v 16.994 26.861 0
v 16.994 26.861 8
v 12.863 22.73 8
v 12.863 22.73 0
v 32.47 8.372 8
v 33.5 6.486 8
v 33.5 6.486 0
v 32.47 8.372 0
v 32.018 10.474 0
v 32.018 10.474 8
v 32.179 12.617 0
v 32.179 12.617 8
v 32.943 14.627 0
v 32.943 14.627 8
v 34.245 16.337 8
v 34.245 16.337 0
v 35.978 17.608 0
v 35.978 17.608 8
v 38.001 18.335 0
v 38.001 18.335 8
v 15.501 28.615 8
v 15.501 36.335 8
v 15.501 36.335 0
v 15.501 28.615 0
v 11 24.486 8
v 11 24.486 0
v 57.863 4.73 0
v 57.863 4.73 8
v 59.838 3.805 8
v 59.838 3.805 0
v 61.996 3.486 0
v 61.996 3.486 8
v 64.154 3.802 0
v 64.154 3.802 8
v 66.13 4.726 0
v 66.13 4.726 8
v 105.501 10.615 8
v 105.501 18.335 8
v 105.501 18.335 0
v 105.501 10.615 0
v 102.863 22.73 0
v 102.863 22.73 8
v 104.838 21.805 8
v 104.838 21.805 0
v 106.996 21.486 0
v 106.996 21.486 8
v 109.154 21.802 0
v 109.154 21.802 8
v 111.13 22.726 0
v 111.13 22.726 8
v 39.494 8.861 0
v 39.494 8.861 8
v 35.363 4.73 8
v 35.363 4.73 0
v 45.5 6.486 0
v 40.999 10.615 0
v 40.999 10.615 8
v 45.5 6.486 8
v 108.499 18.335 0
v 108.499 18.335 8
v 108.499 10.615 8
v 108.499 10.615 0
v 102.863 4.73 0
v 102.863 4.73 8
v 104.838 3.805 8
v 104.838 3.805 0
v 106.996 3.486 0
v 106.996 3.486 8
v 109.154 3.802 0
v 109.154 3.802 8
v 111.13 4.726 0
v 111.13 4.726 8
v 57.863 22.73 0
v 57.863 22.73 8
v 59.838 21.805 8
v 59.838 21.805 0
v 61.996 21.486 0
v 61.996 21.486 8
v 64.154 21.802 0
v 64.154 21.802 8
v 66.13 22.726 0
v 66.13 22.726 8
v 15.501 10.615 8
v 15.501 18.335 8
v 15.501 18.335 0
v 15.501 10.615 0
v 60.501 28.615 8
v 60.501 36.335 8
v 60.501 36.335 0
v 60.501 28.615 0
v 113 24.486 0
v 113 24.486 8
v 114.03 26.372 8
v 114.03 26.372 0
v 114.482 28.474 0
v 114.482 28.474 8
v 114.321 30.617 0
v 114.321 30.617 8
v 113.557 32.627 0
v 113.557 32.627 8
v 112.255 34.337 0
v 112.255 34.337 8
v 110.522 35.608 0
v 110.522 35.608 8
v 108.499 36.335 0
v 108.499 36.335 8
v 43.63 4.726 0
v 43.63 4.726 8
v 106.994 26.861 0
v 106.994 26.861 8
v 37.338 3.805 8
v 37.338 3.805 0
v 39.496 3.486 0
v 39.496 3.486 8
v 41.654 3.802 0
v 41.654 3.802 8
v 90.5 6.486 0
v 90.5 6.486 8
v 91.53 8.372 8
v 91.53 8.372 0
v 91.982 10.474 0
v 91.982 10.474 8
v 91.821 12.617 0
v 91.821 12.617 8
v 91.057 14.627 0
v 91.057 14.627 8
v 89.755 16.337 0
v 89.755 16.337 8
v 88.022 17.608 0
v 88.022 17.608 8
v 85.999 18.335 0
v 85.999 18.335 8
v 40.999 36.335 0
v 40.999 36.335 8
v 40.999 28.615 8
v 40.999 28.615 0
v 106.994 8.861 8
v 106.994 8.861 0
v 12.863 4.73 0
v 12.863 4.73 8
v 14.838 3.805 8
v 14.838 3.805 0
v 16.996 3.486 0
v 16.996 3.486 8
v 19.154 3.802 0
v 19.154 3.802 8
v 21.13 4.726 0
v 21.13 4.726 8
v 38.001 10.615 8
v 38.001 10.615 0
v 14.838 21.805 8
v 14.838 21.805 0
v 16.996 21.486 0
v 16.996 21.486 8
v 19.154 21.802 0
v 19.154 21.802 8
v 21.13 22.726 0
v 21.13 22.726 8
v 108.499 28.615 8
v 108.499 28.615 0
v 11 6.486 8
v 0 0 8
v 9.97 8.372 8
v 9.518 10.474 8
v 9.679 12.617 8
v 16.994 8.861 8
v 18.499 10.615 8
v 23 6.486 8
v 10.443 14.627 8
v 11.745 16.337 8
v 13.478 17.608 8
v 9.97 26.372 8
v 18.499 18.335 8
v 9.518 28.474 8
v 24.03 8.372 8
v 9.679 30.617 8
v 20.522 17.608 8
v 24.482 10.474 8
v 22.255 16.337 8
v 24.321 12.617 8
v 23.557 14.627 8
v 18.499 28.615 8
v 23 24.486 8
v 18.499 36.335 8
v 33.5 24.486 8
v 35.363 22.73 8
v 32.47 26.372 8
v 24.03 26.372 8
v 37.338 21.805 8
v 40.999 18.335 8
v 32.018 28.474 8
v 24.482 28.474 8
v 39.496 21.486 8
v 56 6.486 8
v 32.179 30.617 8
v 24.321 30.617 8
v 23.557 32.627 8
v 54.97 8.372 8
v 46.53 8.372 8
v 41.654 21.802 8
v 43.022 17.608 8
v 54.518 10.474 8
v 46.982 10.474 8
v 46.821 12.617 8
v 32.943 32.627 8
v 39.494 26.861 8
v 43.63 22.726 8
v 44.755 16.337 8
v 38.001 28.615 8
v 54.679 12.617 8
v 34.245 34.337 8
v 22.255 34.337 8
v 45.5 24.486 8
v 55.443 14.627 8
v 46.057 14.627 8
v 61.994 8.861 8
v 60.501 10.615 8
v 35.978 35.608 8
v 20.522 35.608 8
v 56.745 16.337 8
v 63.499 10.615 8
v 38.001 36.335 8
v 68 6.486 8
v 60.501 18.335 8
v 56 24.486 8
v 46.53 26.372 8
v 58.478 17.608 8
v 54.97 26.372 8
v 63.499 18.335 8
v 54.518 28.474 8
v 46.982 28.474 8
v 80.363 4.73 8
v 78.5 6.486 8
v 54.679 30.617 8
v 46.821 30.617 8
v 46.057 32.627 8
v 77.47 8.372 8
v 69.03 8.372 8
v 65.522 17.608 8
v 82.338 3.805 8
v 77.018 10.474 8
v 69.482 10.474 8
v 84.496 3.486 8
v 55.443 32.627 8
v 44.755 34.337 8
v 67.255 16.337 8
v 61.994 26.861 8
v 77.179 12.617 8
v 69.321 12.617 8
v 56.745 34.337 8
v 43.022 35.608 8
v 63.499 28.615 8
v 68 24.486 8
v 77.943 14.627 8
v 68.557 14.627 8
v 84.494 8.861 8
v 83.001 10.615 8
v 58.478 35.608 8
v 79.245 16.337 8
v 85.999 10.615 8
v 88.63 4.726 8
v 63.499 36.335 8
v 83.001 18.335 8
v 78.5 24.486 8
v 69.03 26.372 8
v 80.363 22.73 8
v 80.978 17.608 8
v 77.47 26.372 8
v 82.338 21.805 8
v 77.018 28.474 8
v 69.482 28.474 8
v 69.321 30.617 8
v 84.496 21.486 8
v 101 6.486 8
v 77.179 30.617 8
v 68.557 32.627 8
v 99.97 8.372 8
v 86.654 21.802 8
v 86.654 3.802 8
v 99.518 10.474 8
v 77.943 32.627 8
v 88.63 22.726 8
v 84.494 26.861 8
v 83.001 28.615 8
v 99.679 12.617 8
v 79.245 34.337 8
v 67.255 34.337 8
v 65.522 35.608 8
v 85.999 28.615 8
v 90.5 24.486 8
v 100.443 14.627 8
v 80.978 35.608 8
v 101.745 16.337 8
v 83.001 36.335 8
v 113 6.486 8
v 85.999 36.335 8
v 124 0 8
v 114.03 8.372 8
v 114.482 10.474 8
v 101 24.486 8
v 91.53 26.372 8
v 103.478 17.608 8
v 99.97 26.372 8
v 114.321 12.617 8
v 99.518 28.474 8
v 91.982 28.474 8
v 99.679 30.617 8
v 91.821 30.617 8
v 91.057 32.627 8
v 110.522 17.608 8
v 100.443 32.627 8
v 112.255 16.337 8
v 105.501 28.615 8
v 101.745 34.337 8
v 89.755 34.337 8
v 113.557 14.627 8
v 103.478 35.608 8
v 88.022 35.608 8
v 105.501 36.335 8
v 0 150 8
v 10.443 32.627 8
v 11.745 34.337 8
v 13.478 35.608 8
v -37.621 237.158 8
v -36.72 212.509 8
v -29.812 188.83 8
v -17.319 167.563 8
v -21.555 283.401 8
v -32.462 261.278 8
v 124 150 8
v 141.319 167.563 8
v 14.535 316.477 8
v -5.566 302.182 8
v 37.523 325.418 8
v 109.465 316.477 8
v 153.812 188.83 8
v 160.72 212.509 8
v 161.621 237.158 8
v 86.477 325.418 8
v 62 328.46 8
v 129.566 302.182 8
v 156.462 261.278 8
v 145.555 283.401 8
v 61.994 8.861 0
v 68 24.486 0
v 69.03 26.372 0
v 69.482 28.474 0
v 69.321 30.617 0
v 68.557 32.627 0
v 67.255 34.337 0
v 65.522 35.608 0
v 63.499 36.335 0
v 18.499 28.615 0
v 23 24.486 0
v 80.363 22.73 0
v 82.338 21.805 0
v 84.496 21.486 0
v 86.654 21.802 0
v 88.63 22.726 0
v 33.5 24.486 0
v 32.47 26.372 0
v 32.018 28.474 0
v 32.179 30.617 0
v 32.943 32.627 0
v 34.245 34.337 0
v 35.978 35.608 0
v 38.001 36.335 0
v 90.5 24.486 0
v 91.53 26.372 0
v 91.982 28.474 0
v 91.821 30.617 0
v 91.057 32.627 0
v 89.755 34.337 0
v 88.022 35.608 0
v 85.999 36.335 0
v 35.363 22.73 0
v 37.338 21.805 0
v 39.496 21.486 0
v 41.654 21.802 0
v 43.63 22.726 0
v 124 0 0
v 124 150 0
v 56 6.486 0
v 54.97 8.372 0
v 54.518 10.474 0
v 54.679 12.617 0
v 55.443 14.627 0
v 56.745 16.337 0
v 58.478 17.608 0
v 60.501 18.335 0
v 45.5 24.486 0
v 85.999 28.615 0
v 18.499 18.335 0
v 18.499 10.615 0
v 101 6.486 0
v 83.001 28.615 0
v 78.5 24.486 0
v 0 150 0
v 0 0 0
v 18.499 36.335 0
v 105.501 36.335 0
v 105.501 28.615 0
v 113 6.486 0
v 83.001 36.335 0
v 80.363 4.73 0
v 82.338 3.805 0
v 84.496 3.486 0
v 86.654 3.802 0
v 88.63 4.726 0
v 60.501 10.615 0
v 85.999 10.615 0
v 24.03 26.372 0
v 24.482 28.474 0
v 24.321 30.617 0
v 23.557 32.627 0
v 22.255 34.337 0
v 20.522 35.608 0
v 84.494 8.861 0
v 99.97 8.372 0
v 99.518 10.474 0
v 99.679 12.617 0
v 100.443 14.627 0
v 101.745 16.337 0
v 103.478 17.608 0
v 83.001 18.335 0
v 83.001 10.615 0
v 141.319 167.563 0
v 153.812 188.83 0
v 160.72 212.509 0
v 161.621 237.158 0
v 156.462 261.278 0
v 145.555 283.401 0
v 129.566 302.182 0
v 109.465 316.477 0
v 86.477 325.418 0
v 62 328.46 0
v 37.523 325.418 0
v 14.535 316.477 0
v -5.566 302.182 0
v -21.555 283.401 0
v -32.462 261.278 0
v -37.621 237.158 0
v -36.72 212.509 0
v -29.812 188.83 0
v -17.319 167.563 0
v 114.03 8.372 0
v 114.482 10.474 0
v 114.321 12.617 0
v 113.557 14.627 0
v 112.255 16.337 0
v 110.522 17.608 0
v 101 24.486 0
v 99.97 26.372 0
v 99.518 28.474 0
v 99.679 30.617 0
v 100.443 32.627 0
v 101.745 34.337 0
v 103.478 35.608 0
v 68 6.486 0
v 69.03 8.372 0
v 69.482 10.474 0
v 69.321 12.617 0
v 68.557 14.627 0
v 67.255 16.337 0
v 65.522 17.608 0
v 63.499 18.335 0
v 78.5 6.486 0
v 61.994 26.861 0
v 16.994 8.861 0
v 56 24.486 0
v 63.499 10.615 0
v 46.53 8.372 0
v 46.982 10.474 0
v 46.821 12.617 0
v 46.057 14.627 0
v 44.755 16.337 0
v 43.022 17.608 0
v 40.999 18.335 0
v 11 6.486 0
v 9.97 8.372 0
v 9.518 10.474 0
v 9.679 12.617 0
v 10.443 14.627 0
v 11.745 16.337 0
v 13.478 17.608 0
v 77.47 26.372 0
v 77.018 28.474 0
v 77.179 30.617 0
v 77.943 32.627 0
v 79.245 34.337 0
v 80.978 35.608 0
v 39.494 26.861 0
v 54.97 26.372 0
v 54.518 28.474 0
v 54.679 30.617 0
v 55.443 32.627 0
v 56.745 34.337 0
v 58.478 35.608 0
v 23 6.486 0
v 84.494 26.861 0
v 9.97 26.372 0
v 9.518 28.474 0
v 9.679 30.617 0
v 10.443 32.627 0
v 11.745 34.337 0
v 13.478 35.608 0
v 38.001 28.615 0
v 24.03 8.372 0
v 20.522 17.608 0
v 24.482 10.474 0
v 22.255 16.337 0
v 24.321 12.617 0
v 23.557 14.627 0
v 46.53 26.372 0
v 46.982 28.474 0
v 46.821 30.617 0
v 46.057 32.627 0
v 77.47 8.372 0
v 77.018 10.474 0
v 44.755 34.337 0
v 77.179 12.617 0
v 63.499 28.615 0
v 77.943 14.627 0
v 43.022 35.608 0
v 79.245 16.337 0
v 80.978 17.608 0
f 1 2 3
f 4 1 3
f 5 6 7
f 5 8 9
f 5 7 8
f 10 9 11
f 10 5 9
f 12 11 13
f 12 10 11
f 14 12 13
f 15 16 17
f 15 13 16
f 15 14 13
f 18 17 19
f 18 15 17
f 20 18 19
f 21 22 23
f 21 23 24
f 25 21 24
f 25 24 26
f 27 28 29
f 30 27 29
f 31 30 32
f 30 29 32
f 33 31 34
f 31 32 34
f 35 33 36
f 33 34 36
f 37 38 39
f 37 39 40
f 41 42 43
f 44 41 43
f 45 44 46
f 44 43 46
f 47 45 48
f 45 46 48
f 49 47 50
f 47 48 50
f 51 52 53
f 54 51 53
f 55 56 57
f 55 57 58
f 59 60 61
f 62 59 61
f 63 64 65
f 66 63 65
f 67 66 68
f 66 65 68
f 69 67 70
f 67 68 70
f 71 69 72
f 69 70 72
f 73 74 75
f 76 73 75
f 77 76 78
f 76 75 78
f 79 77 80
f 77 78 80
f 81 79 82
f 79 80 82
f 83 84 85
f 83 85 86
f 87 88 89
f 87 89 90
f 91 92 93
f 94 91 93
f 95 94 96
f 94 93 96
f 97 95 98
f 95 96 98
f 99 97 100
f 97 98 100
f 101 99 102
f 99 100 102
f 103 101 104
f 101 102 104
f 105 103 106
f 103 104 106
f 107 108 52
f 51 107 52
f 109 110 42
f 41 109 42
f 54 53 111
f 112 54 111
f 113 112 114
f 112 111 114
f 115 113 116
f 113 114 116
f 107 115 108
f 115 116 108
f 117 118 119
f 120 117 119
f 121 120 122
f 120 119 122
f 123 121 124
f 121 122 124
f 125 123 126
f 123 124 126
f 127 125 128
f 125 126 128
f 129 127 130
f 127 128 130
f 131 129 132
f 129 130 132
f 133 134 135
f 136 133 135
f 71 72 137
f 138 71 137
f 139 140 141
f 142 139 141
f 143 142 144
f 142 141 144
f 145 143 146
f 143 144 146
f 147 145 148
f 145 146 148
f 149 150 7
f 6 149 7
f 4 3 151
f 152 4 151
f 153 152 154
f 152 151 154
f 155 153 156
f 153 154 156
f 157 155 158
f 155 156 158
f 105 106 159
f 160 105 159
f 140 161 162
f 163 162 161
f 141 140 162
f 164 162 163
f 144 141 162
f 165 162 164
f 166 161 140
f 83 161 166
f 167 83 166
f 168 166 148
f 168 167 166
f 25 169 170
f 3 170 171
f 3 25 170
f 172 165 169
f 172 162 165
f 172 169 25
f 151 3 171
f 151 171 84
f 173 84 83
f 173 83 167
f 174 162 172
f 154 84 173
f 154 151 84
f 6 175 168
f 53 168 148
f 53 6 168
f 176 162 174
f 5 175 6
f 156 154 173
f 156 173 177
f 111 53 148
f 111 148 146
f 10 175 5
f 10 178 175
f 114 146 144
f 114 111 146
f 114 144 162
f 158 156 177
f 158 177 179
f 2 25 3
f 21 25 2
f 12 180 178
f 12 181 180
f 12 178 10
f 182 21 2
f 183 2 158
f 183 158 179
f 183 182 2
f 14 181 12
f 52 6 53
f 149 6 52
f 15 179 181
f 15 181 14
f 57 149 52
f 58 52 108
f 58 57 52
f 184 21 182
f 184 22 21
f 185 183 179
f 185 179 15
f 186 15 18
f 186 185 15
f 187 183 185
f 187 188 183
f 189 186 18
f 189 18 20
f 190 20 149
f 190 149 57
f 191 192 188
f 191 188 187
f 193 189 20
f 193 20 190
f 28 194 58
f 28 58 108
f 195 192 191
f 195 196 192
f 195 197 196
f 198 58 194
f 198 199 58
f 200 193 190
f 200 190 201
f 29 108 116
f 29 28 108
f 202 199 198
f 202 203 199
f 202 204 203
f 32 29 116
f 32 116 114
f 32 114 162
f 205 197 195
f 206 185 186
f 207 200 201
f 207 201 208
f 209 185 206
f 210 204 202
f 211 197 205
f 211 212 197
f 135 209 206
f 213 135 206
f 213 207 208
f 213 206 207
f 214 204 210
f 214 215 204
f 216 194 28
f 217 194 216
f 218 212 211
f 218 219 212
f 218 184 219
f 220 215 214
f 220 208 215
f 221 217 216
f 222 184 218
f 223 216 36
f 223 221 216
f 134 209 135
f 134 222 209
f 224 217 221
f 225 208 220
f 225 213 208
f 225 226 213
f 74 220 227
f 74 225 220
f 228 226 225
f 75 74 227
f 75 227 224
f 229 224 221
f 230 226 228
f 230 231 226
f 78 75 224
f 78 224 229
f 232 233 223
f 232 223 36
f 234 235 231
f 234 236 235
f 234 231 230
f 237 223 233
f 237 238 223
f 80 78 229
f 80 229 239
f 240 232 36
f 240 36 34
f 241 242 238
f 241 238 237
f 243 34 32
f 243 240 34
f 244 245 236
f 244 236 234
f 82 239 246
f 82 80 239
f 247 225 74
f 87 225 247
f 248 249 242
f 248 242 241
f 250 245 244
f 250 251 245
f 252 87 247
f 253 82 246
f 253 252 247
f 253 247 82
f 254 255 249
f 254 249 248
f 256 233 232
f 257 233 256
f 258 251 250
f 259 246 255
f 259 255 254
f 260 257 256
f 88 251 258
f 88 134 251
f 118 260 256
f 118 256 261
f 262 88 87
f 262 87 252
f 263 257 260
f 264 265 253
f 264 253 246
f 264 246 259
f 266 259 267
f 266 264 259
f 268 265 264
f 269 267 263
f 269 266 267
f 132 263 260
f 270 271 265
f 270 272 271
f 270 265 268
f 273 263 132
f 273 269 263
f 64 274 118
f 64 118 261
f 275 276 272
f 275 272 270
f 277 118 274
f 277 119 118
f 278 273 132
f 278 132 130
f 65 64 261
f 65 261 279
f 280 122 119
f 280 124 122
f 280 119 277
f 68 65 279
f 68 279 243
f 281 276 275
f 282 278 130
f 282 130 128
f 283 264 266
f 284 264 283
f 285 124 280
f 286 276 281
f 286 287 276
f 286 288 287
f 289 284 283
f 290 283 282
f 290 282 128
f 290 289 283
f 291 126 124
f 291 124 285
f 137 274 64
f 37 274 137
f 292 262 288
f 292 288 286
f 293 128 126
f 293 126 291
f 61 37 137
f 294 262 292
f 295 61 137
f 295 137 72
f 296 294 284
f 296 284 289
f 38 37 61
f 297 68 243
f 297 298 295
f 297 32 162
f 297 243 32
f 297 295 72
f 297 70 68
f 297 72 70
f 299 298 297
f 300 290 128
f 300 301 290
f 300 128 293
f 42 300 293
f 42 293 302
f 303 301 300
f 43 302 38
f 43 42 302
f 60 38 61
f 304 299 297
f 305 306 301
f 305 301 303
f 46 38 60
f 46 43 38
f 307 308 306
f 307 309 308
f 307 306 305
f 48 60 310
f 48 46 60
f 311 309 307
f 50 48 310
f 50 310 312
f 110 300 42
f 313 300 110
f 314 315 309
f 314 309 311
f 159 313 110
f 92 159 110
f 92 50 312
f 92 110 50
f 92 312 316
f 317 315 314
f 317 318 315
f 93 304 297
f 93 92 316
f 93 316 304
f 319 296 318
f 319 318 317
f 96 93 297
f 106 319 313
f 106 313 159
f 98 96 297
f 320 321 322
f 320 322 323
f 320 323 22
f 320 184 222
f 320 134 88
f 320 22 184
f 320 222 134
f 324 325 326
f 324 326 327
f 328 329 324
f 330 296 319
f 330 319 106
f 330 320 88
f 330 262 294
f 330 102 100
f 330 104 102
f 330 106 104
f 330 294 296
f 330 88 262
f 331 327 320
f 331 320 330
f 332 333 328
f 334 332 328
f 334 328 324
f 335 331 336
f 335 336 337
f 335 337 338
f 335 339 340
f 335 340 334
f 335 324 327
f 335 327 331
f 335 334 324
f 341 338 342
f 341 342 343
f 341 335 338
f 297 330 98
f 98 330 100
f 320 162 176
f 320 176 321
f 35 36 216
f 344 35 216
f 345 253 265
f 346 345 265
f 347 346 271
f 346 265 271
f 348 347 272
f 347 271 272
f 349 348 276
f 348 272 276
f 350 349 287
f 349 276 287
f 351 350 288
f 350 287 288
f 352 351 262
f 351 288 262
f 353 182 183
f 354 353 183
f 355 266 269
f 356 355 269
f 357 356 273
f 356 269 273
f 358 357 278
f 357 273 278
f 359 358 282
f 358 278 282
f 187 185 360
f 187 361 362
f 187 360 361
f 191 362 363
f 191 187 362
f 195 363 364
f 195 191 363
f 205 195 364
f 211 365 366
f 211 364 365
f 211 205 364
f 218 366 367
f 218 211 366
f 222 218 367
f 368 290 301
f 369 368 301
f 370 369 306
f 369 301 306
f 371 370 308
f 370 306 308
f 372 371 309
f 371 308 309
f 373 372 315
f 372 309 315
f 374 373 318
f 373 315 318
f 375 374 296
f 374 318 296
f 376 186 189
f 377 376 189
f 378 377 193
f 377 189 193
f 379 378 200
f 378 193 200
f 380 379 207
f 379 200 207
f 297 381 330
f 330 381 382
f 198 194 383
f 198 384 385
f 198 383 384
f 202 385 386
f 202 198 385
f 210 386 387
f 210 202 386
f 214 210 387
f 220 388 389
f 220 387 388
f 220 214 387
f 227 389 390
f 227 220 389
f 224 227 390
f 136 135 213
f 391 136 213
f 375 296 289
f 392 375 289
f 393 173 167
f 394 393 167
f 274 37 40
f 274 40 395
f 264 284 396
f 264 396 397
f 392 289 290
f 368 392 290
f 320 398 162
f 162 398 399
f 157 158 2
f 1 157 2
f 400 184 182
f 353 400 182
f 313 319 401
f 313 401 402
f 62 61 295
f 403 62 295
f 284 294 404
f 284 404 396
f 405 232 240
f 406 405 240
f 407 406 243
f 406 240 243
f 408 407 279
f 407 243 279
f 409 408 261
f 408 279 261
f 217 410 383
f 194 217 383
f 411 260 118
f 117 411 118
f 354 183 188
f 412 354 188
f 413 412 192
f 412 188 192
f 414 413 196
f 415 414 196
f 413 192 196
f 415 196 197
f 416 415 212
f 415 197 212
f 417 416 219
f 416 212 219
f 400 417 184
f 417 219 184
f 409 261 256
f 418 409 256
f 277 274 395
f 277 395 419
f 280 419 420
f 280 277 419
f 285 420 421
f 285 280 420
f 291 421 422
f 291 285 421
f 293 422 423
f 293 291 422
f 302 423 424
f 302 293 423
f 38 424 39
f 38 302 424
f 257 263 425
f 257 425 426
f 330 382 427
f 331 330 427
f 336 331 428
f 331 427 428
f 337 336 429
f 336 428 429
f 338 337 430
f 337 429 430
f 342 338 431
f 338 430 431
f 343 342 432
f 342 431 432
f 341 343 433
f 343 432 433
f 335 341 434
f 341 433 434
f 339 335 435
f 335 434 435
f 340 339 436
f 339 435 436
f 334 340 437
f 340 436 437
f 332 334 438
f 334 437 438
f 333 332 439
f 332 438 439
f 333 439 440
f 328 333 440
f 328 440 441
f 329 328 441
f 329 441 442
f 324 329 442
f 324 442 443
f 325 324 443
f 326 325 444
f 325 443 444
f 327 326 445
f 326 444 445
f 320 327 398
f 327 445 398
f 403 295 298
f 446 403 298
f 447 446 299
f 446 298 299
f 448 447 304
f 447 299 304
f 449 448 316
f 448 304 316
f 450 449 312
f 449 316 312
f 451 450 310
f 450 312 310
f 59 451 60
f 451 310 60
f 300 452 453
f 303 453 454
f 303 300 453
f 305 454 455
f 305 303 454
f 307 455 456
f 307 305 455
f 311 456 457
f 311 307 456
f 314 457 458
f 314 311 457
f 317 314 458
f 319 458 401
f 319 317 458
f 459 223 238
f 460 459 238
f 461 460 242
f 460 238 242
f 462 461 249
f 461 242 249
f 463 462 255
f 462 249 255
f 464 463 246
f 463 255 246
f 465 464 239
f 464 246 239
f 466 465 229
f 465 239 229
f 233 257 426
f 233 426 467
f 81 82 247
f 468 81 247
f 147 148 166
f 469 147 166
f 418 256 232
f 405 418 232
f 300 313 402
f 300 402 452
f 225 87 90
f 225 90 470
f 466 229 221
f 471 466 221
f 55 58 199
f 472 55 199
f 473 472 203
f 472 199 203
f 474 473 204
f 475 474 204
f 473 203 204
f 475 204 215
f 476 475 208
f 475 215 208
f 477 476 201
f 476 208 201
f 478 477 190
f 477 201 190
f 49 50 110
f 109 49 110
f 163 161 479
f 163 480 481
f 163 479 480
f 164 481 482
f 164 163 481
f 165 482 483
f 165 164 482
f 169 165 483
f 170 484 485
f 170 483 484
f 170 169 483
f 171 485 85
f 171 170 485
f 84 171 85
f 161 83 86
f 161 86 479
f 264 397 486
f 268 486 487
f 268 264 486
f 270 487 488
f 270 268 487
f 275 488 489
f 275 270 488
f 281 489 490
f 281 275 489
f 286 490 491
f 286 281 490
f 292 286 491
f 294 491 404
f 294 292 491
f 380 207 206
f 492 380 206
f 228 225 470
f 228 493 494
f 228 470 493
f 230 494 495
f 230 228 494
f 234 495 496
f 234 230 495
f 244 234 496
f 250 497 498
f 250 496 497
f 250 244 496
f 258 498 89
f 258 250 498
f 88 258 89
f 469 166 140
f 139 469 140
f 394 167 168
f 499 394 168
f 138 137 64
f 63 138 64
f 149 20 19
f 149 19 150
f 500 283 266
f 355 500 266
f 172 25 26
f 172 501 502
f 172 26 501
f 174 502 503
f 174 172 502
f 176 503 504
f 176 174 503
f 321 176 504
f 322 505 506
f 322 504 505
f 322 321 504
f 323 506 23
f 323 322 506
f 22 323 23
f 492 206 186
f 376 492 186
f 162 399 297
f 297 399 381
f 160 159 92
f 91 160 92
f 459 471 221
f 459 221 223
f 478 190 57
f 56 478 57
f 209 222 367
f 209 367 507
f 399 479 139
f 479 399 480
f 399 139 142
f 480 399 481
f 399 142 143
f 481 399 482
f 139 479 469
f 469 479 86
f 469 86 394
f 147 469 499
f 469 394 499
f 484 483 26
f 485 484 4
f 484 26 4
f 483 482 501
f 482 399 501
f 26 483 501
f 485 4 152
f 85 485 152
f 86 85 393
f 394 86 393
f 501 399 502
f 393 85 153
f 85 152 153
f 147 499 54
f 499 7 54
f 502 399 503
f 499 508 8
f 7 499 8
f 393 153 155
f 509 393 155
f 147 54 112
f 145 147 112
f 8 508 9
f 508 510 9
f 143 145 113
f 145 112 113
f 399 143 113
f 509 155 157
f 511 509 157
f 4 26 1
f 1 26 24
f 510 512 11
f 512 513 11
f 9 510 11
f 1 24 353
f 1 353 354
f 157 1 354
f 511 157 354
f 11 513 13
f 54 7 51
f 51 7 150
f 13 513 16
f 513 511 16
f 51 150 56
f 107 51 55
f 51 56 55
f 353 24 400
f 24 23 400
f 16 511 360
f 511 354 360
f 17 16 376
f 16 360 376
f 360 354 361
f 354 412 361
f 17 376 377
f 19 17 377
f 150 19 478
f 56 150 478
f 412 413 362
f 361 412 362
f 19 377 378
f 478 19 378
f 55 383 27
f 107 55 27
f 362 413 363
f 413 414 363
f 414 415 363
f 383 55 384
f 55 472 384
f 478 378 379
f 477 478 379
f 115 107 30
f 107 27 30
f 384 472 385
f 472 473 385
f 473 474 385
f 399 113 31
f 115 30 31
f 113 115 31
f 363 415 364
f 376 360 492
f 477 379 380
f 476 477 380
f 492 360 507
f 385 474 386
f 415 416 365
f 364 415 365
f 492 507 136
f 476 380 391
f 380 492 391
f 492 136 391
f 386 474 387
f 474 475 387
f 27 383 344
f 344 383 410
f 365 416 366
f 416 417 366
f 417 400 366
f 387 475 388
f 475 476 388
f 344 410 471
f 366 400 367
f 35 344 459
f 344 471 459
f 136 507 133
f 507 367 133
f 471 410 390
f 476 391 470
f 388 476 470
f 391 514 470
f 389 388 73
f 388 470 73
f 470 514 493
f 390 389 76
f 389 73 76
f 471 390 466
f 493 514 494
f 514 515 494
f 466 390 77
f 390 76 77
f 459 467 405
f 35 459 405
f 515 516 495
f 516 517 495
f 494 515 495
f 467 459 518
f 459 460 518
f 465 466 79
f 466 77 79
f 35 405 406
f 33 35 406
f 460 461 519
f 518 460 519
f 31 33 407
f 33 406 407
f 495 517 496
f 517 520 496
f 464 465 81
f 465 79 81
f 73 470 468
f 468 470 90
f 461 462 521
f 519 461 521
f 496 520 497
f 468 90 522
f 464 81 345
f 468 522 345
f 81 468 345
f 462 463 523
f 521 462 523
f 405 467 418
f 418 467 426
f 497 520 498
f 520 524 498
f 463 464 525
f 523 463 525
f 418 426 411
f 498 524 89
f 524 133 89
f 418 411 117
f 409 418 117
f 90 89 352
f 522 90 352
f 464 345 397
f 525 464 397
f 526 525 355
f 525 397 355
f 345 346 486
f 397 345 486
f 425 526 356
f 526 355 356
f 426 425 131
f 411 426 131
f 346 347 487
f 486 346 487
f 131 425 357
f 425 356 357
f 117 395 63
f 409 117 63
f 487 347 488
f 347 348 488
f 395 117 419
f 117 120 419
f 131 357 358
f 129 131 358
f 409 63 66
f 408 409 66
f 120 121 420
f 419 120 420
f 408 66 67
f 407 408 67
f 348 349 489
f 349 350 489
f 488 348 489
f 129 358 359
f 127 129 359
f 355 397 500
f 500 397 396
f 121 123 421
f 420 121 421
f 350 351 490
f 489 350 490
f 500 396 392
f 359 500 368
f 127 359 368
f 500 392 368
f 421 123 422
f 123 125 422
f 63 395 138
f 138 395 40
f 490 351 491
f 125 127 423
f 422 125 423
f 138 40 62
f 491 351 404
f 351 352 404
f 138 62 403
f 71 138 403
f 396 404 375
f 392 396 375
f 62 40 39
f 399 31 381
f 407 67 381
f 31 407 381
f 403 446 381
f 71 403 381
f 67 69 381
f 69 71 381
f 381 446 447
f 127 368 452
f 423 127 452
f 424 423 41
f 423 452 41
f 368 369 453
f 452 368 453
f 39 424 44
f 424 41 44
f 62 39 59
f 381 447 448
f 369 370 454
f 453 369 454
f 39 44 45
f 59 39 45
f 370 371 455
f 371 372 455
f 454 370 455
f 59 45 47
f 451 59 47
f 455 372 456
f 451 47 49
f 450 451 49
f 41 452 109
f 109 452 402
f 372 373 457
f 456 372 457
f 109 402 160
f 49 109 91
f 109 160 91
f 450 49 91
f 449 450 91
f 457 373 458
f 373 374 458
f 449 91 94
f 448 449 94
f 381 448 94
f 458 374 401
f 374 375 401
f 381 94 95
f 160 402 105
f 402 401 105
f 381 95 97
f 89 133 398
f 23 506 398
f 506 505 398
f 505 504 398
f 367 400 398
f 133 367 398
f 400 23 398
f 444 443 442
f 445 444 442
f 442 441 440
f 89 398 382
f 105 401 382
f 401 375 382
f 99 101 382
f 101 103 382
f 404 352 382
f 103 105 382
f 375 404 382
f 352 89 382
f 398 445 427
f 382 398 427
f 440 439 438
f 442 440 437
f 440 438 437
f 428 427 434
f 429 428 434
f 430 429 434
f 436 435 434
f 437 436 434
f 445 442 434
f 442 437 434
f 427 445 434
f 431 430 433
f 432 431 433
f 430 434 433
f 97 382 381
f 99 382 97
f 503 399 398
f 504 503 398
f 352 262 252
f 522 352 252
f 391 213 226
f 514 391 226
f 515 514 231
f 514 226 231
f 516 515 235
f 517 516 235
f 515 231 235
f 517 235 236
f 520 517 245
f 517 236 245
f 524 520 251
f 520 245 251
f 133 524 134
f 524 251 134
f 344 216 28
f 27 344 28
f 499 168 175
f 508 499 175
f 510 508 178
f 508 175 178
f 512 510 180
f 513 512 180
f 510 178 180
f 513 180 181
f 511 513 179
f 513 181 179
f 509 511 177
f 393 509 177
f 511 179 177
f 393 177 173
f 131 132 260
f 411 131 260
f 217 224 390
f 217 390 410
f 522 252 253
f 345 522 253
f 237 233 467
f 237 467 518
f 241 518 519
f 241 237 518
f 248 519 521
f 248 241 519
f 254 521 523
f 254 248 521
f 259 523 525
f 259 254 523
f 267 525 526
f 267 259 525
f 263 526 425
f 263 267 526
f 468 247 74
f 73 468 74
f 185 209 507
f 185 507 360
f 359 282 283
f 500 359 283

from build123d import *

# Parameters (mm, degrees)
EXTRUDE_1_DEPTH     = 8
CUT_EXTRUDE_1_DEPTH = 10


with BuildPart() as part:
    # 草图1 → 凸台-拉伸1 (new body)
    with BuildSketch(Plane.XY):
        with BuildLine():
            Line((0, 0), (124, 0))
            Line((124, 0), (124, 150))
            ThreePointArc((124, 150), (62, 328.460180984), (0, 150))
            Line((0, 150), (0, 0))
        make_face()
    extrude(amount=EXTRUDE_1_DEPTH)

    # 草图2 → 切除-拉伸1 (cut)
    with BuildSketch(Plane.XY.offset(8)):
        with BuildLine():
            Line((38.000879916, 18.335012989), (38.000879916, 10.614550667))
            Line((38.000879916, 10.614550667), (33.500377126, 6.485861413))
            ThreePointArc((33.500377126, 6.485861413), (32.48869593, 13.649372886), (38.000879916, 18.335012989))
        make_face()
        with BuildLine():
            Line((40.999120084, 18.335012989), (40.999120084, 10.614550667))
            Line((40.999120084, 10.614550667), (45.499622874, 6.485861413))
            ThreePointArc((45.499622874, 6.485861413), (46.51130407, 13.649372886), (40.999120084, 18.335012989))
        make_face()
        with BuildLine():
            Line((43.629589922, 4.725654413), (39.494098953, 8.861145382))
            Line((39.494098953, 8.861145382), (35.363302178, 4.730348608))
            ThreePointArc((35.363302178, 4.730348608), (39.495740959, 3.486365412), (43.629589922, 4.725654413))
        make_face()
        with BuildLine():
            Line((60.500879916, 18.335012989), (60.500879916, 10.614550667))
            Line((60.500879916, 10.614550667), (56.000377126, 6.485861413))
            ThreePointArc((56.000377126, 6.485861413), (54.98869593, 13.649372886), (60.500879916, 18.335012989))
        make_face()
        with BuildLine():
            Line((63.499120084, 18.335012989), (63.499120084, 10.614550667))
            Line((63.499120084, 10.614550667), (67.999622874, 6.485861413))
            ThreePointArc((67.999622874, 6.485861413), (69.01130407, 13.649372886), (63.499120084, 18.335012989))
        make_face()
        with BuildLine():
            Line((66.129589922, 4.725654413), (61.994098953, 8.861145382))
            Line((61.994098953, 8.861145382), (57.863302178, 4.730348608))
            ThreePointArc((57.863302178, 4.730348608), (61.995740959, 3.486365412), (66.129589922, 4.725654413))
        make_face()
        with BuildLine():
            Line((83.000879916, 18.335012989), (83.000879916, 10.614550667))
            Line((83.000879916, 10.614550667), (78.500377126, 6.485861413))
            ThreePointArc((78.500377126, 6.485861413), (77.48869593, 13.649372886), (83.000879916, 18.335012989))
        make_face()
        with BuildLine():
            Line((85.999120084, 18.335012989), (85.999120084, 10.614550667))
            Line((85.999120084, 10.614550667), (90.499622874, 6.485861413))
            ThreePointArc((90.499622874, 6.485861413), (91.51130407, 13.649372886), (85.999120084, 18.335012989))
        make_face()
        with BuildLine():
            Line((88.629589922, 4.725654413), (84.494098953, 8.861145382))
            Line((84.494098953, 8.861145382), (80.363302178, 4.730348608))
            ThreePointArc((80.363302178, 4.730348608), (84.495740959, 3.486365412), (88.629589922, 4.725654413))
        make_face()
        with BuildLine():
            Line((105.500879916, 18.335012989), (105.500879916, 10.614550667))
            Line((105.500879916, 10.614550667), (101.000377126, 6.485861413))
            ThreePointArc((101.000377126, 6.485861413), (99.98869593, 13.649372886), (105.500879916, 18.335012989))
        make_face()
        with BuildLine():
            Line((108.499120084, 18.335012989), (108.499120084, 10.614550667))
            Line((108.499120084, 10.614550667), (112.999622874, 6.485861413))
            ThreePointArc((112.999622874, 6.485861413), (114.01130407, 13.649372886), (108.499120084, 18.335012989))
        make_face()
        with BuildLine():
            Line((111.129589922, 4.725654413), (106.994098953, 8.861145382))
            Line((106.994098953, 8.861145382), (102.863302178, 4.730348608))
            ThreePointArc((102.863302178, 4.730348608), (106.995740959, 3.486365412), (111.129589922, 4.725654413))
        make_face()
        with BuildLine():
            Line((38.000879916, 36.335012989), (38.000879916, 28.614550667))
            Line((38.000879916, 28.614550667), (33.500377126, 24.485861413))
            ThreePointArc((33.500377126, 24.485861413), (32.48869593, 31.649372886), (38.000879916, 36.335012989))
        make_face()
        with BuildLine():
            Line((40.999120084, 36.335012989), (40.999120084, 28.614550667))
            Line((40.999120084, 28.614550667), (45.499622874, 24.485861413))
            ThreePointArc((45.499622874, 24.485861413), (46.51130407, 31.649372886), (40.999120084, 36.335012989))
        make_face()
        with BuildLine():
            Line((15.500879916, 18.335012989), (15.500879916, 10.614550667))
            Line((15.500879916, 10.614550667), (11.000377126, 6.485861413))
            ThreePointArc((11.000377126, 6.485861413), (9.98869593, 13.649372886), (15.500879916, 18.335012989))
        make_face()
        with BuildLine():
            Line((18.499120084, 18.335012989), (18.499120084, 10.614550667))
            Line((18.499120084, 10.614550667), (22.999622874, 6.485861413))
            ThreePointArc((22.999622874, 6.485861413), (24.01130407, 13.649372886), (18.499120084, 18.335012989))
        make_face()
        with BuildLine():
            Line((21.129589922, 4.725654413), (16.994098953, 8.861145382))
            Line((16.994098953, 8.861145382), (12.863302178, 4.730348608))
            ThreePointArc((12.863302178, 4.730348608), (16.995740959, 3.486365412), (21.129589922, 4.725654413))
        make_face()
        with BuildLine():
            Line((43.629589922, 22.725654413), (39.494098953, 26.861145382))
            Line((39.494098953, 26.861145382), (35.363302178, 22.730348608))
            ThreePointArc((35.363302178, 22.730348608), (39.495740959, 21.486365412), (43.629589922, 22.725654413))
        make_face()
        with BuildLine():
            Line((60.500879916, 36.335012989), (60.500879916, 28.614550667))
            Line((60.500879916, 28.614550667), (56.000377126, 24.485861413))
            ThreePointArc((56.000377126, 24.485861413), (54.98869593, 31.649372886), (60.500879916, 36.335012989))
        make_face()
        with BuildLine():
            Line((63.499120084, 36.335012989), (63.499120084, 28.614550667))
            Line((63.499120084, 28.614550667), (67.999622874, 24.485861413))
            ThreePointArc((67.999622874, 24.485861413), (69.01130407, 31.649372886), (63.499120084, 36.335012989))
        make_face()
        with BuildLine():
            Line((66.129589922, 22.725654413), (61.994098953, 26.861145382))
            Line((61.994098953, 26.861145382), (57.863302178, 22.730348608))
            ThreePointArc((57.863302178, 22.730348608), (61.995740959, 21.486365412), (66.129589922, 22.725654413))
        make_face()
        with BuildLine():
            Line((83.000879916, 36.335012989), (83.000879916, 28.614550667))
            Line((83.000879916, 28.614550667), (78.500377126, 24.485861413))
            ThreePointArc((78.500377126, 24.485861413), (77.48869593, 31.649372886), (83.000879916, 36.335012989))
        make_face()
        with BuildLine():
            Line((85.999120084, 36.335012989), (85.999120084, 28.614550667))
            Line((85.999120084, 28.614550667), (90.499622874, 24.485861413))
            ThreePointArc((90.499622874, 24.485861413), (91.51130407, 31.649372886), (85.999120084, 36.335012989))
        make_face()
        with BuildLine():
            Line((88.629589922, 22.725654413), (84.494098953, 26.861145382))
            Line((84.494098953, 26.861145382), (80.363302178, 22.730348608))
            ThreePointArc((80.363302178, 22.730348608), (84.495740959, 21.486365412), (88.629589922, 22.725654413))
        make_face()
        with BuildLine():
            Line((105.500879916, 36.335012989), (105.500879916, 28.614550667))
            Line((105.500879916, 28.614550667), (101.000377126, 24.485861413))
            ThreePointArc((101.000377126, 24.485861413), (99.98869593, 31.649372886), (105.500879916, 36.335012989))
        make_face()
        with BuildLine():
            Line((108.499120084, 36.335012989), (108.499120084, 28.614550667))
            Line((108.499120084, 28.614550667), (112.999622874, 24.485861413))
            ThreePointArc((112.999622874, 24.485861413), (114.01130407, 31.649372886), (108.499120084, 36.335012989))
        make_face()
        with BuildLine():
            Line((111.129589922, 22.725654413), (106.994098953, 26.861145382))
            Line((106.994098953, 26.861145382), (102.863302178, 22.730348608))
            ThreePointArc((102.863302178, 22.730348608), (106.995740959, 21.486365412), (111.129589922, 22.725654413))
        make_face()
        with BuildLine():
            Line((15.500879916, 36.335012989), (15.500879916, 28.614550667))
            Line((15.500879916, 28.614550667), (11.000377126, 24.485861413))
            ThreePointArc((11.000377126, 24.485861413), (9.98869593, 31.649372886), (15.500879916, 36.335012989))
        make_face()
        with BuildLine():
            Line((18.499120084, 36.335012989), (18.499120084, 28.614550667))
            Line((18.499120084, 28.614550667), (22.999622874, 24.485861413))
            ThreePointArc((22.999622874, 24.485861413), (24.01130407, 31.649372886), (18.499120084, 36.335012989))
        make_face()
        with BuildLine():
            Line((21.129589922, 22.725654413), (16.994098953, 26.861145382))
            Line((16.994098953, 26.861145382), (12.863302178, 22.730348608))
            ThreePointArc((12.863302178, 22.730348608), (16.995740959, 21.486365412), (21.129589922, 22.725654413))
        make_face()
    extrude(amount=-CUT_EXTRUDE_1_DEPTH, mode=Mode.SUBTRACT)


solid = part.part
